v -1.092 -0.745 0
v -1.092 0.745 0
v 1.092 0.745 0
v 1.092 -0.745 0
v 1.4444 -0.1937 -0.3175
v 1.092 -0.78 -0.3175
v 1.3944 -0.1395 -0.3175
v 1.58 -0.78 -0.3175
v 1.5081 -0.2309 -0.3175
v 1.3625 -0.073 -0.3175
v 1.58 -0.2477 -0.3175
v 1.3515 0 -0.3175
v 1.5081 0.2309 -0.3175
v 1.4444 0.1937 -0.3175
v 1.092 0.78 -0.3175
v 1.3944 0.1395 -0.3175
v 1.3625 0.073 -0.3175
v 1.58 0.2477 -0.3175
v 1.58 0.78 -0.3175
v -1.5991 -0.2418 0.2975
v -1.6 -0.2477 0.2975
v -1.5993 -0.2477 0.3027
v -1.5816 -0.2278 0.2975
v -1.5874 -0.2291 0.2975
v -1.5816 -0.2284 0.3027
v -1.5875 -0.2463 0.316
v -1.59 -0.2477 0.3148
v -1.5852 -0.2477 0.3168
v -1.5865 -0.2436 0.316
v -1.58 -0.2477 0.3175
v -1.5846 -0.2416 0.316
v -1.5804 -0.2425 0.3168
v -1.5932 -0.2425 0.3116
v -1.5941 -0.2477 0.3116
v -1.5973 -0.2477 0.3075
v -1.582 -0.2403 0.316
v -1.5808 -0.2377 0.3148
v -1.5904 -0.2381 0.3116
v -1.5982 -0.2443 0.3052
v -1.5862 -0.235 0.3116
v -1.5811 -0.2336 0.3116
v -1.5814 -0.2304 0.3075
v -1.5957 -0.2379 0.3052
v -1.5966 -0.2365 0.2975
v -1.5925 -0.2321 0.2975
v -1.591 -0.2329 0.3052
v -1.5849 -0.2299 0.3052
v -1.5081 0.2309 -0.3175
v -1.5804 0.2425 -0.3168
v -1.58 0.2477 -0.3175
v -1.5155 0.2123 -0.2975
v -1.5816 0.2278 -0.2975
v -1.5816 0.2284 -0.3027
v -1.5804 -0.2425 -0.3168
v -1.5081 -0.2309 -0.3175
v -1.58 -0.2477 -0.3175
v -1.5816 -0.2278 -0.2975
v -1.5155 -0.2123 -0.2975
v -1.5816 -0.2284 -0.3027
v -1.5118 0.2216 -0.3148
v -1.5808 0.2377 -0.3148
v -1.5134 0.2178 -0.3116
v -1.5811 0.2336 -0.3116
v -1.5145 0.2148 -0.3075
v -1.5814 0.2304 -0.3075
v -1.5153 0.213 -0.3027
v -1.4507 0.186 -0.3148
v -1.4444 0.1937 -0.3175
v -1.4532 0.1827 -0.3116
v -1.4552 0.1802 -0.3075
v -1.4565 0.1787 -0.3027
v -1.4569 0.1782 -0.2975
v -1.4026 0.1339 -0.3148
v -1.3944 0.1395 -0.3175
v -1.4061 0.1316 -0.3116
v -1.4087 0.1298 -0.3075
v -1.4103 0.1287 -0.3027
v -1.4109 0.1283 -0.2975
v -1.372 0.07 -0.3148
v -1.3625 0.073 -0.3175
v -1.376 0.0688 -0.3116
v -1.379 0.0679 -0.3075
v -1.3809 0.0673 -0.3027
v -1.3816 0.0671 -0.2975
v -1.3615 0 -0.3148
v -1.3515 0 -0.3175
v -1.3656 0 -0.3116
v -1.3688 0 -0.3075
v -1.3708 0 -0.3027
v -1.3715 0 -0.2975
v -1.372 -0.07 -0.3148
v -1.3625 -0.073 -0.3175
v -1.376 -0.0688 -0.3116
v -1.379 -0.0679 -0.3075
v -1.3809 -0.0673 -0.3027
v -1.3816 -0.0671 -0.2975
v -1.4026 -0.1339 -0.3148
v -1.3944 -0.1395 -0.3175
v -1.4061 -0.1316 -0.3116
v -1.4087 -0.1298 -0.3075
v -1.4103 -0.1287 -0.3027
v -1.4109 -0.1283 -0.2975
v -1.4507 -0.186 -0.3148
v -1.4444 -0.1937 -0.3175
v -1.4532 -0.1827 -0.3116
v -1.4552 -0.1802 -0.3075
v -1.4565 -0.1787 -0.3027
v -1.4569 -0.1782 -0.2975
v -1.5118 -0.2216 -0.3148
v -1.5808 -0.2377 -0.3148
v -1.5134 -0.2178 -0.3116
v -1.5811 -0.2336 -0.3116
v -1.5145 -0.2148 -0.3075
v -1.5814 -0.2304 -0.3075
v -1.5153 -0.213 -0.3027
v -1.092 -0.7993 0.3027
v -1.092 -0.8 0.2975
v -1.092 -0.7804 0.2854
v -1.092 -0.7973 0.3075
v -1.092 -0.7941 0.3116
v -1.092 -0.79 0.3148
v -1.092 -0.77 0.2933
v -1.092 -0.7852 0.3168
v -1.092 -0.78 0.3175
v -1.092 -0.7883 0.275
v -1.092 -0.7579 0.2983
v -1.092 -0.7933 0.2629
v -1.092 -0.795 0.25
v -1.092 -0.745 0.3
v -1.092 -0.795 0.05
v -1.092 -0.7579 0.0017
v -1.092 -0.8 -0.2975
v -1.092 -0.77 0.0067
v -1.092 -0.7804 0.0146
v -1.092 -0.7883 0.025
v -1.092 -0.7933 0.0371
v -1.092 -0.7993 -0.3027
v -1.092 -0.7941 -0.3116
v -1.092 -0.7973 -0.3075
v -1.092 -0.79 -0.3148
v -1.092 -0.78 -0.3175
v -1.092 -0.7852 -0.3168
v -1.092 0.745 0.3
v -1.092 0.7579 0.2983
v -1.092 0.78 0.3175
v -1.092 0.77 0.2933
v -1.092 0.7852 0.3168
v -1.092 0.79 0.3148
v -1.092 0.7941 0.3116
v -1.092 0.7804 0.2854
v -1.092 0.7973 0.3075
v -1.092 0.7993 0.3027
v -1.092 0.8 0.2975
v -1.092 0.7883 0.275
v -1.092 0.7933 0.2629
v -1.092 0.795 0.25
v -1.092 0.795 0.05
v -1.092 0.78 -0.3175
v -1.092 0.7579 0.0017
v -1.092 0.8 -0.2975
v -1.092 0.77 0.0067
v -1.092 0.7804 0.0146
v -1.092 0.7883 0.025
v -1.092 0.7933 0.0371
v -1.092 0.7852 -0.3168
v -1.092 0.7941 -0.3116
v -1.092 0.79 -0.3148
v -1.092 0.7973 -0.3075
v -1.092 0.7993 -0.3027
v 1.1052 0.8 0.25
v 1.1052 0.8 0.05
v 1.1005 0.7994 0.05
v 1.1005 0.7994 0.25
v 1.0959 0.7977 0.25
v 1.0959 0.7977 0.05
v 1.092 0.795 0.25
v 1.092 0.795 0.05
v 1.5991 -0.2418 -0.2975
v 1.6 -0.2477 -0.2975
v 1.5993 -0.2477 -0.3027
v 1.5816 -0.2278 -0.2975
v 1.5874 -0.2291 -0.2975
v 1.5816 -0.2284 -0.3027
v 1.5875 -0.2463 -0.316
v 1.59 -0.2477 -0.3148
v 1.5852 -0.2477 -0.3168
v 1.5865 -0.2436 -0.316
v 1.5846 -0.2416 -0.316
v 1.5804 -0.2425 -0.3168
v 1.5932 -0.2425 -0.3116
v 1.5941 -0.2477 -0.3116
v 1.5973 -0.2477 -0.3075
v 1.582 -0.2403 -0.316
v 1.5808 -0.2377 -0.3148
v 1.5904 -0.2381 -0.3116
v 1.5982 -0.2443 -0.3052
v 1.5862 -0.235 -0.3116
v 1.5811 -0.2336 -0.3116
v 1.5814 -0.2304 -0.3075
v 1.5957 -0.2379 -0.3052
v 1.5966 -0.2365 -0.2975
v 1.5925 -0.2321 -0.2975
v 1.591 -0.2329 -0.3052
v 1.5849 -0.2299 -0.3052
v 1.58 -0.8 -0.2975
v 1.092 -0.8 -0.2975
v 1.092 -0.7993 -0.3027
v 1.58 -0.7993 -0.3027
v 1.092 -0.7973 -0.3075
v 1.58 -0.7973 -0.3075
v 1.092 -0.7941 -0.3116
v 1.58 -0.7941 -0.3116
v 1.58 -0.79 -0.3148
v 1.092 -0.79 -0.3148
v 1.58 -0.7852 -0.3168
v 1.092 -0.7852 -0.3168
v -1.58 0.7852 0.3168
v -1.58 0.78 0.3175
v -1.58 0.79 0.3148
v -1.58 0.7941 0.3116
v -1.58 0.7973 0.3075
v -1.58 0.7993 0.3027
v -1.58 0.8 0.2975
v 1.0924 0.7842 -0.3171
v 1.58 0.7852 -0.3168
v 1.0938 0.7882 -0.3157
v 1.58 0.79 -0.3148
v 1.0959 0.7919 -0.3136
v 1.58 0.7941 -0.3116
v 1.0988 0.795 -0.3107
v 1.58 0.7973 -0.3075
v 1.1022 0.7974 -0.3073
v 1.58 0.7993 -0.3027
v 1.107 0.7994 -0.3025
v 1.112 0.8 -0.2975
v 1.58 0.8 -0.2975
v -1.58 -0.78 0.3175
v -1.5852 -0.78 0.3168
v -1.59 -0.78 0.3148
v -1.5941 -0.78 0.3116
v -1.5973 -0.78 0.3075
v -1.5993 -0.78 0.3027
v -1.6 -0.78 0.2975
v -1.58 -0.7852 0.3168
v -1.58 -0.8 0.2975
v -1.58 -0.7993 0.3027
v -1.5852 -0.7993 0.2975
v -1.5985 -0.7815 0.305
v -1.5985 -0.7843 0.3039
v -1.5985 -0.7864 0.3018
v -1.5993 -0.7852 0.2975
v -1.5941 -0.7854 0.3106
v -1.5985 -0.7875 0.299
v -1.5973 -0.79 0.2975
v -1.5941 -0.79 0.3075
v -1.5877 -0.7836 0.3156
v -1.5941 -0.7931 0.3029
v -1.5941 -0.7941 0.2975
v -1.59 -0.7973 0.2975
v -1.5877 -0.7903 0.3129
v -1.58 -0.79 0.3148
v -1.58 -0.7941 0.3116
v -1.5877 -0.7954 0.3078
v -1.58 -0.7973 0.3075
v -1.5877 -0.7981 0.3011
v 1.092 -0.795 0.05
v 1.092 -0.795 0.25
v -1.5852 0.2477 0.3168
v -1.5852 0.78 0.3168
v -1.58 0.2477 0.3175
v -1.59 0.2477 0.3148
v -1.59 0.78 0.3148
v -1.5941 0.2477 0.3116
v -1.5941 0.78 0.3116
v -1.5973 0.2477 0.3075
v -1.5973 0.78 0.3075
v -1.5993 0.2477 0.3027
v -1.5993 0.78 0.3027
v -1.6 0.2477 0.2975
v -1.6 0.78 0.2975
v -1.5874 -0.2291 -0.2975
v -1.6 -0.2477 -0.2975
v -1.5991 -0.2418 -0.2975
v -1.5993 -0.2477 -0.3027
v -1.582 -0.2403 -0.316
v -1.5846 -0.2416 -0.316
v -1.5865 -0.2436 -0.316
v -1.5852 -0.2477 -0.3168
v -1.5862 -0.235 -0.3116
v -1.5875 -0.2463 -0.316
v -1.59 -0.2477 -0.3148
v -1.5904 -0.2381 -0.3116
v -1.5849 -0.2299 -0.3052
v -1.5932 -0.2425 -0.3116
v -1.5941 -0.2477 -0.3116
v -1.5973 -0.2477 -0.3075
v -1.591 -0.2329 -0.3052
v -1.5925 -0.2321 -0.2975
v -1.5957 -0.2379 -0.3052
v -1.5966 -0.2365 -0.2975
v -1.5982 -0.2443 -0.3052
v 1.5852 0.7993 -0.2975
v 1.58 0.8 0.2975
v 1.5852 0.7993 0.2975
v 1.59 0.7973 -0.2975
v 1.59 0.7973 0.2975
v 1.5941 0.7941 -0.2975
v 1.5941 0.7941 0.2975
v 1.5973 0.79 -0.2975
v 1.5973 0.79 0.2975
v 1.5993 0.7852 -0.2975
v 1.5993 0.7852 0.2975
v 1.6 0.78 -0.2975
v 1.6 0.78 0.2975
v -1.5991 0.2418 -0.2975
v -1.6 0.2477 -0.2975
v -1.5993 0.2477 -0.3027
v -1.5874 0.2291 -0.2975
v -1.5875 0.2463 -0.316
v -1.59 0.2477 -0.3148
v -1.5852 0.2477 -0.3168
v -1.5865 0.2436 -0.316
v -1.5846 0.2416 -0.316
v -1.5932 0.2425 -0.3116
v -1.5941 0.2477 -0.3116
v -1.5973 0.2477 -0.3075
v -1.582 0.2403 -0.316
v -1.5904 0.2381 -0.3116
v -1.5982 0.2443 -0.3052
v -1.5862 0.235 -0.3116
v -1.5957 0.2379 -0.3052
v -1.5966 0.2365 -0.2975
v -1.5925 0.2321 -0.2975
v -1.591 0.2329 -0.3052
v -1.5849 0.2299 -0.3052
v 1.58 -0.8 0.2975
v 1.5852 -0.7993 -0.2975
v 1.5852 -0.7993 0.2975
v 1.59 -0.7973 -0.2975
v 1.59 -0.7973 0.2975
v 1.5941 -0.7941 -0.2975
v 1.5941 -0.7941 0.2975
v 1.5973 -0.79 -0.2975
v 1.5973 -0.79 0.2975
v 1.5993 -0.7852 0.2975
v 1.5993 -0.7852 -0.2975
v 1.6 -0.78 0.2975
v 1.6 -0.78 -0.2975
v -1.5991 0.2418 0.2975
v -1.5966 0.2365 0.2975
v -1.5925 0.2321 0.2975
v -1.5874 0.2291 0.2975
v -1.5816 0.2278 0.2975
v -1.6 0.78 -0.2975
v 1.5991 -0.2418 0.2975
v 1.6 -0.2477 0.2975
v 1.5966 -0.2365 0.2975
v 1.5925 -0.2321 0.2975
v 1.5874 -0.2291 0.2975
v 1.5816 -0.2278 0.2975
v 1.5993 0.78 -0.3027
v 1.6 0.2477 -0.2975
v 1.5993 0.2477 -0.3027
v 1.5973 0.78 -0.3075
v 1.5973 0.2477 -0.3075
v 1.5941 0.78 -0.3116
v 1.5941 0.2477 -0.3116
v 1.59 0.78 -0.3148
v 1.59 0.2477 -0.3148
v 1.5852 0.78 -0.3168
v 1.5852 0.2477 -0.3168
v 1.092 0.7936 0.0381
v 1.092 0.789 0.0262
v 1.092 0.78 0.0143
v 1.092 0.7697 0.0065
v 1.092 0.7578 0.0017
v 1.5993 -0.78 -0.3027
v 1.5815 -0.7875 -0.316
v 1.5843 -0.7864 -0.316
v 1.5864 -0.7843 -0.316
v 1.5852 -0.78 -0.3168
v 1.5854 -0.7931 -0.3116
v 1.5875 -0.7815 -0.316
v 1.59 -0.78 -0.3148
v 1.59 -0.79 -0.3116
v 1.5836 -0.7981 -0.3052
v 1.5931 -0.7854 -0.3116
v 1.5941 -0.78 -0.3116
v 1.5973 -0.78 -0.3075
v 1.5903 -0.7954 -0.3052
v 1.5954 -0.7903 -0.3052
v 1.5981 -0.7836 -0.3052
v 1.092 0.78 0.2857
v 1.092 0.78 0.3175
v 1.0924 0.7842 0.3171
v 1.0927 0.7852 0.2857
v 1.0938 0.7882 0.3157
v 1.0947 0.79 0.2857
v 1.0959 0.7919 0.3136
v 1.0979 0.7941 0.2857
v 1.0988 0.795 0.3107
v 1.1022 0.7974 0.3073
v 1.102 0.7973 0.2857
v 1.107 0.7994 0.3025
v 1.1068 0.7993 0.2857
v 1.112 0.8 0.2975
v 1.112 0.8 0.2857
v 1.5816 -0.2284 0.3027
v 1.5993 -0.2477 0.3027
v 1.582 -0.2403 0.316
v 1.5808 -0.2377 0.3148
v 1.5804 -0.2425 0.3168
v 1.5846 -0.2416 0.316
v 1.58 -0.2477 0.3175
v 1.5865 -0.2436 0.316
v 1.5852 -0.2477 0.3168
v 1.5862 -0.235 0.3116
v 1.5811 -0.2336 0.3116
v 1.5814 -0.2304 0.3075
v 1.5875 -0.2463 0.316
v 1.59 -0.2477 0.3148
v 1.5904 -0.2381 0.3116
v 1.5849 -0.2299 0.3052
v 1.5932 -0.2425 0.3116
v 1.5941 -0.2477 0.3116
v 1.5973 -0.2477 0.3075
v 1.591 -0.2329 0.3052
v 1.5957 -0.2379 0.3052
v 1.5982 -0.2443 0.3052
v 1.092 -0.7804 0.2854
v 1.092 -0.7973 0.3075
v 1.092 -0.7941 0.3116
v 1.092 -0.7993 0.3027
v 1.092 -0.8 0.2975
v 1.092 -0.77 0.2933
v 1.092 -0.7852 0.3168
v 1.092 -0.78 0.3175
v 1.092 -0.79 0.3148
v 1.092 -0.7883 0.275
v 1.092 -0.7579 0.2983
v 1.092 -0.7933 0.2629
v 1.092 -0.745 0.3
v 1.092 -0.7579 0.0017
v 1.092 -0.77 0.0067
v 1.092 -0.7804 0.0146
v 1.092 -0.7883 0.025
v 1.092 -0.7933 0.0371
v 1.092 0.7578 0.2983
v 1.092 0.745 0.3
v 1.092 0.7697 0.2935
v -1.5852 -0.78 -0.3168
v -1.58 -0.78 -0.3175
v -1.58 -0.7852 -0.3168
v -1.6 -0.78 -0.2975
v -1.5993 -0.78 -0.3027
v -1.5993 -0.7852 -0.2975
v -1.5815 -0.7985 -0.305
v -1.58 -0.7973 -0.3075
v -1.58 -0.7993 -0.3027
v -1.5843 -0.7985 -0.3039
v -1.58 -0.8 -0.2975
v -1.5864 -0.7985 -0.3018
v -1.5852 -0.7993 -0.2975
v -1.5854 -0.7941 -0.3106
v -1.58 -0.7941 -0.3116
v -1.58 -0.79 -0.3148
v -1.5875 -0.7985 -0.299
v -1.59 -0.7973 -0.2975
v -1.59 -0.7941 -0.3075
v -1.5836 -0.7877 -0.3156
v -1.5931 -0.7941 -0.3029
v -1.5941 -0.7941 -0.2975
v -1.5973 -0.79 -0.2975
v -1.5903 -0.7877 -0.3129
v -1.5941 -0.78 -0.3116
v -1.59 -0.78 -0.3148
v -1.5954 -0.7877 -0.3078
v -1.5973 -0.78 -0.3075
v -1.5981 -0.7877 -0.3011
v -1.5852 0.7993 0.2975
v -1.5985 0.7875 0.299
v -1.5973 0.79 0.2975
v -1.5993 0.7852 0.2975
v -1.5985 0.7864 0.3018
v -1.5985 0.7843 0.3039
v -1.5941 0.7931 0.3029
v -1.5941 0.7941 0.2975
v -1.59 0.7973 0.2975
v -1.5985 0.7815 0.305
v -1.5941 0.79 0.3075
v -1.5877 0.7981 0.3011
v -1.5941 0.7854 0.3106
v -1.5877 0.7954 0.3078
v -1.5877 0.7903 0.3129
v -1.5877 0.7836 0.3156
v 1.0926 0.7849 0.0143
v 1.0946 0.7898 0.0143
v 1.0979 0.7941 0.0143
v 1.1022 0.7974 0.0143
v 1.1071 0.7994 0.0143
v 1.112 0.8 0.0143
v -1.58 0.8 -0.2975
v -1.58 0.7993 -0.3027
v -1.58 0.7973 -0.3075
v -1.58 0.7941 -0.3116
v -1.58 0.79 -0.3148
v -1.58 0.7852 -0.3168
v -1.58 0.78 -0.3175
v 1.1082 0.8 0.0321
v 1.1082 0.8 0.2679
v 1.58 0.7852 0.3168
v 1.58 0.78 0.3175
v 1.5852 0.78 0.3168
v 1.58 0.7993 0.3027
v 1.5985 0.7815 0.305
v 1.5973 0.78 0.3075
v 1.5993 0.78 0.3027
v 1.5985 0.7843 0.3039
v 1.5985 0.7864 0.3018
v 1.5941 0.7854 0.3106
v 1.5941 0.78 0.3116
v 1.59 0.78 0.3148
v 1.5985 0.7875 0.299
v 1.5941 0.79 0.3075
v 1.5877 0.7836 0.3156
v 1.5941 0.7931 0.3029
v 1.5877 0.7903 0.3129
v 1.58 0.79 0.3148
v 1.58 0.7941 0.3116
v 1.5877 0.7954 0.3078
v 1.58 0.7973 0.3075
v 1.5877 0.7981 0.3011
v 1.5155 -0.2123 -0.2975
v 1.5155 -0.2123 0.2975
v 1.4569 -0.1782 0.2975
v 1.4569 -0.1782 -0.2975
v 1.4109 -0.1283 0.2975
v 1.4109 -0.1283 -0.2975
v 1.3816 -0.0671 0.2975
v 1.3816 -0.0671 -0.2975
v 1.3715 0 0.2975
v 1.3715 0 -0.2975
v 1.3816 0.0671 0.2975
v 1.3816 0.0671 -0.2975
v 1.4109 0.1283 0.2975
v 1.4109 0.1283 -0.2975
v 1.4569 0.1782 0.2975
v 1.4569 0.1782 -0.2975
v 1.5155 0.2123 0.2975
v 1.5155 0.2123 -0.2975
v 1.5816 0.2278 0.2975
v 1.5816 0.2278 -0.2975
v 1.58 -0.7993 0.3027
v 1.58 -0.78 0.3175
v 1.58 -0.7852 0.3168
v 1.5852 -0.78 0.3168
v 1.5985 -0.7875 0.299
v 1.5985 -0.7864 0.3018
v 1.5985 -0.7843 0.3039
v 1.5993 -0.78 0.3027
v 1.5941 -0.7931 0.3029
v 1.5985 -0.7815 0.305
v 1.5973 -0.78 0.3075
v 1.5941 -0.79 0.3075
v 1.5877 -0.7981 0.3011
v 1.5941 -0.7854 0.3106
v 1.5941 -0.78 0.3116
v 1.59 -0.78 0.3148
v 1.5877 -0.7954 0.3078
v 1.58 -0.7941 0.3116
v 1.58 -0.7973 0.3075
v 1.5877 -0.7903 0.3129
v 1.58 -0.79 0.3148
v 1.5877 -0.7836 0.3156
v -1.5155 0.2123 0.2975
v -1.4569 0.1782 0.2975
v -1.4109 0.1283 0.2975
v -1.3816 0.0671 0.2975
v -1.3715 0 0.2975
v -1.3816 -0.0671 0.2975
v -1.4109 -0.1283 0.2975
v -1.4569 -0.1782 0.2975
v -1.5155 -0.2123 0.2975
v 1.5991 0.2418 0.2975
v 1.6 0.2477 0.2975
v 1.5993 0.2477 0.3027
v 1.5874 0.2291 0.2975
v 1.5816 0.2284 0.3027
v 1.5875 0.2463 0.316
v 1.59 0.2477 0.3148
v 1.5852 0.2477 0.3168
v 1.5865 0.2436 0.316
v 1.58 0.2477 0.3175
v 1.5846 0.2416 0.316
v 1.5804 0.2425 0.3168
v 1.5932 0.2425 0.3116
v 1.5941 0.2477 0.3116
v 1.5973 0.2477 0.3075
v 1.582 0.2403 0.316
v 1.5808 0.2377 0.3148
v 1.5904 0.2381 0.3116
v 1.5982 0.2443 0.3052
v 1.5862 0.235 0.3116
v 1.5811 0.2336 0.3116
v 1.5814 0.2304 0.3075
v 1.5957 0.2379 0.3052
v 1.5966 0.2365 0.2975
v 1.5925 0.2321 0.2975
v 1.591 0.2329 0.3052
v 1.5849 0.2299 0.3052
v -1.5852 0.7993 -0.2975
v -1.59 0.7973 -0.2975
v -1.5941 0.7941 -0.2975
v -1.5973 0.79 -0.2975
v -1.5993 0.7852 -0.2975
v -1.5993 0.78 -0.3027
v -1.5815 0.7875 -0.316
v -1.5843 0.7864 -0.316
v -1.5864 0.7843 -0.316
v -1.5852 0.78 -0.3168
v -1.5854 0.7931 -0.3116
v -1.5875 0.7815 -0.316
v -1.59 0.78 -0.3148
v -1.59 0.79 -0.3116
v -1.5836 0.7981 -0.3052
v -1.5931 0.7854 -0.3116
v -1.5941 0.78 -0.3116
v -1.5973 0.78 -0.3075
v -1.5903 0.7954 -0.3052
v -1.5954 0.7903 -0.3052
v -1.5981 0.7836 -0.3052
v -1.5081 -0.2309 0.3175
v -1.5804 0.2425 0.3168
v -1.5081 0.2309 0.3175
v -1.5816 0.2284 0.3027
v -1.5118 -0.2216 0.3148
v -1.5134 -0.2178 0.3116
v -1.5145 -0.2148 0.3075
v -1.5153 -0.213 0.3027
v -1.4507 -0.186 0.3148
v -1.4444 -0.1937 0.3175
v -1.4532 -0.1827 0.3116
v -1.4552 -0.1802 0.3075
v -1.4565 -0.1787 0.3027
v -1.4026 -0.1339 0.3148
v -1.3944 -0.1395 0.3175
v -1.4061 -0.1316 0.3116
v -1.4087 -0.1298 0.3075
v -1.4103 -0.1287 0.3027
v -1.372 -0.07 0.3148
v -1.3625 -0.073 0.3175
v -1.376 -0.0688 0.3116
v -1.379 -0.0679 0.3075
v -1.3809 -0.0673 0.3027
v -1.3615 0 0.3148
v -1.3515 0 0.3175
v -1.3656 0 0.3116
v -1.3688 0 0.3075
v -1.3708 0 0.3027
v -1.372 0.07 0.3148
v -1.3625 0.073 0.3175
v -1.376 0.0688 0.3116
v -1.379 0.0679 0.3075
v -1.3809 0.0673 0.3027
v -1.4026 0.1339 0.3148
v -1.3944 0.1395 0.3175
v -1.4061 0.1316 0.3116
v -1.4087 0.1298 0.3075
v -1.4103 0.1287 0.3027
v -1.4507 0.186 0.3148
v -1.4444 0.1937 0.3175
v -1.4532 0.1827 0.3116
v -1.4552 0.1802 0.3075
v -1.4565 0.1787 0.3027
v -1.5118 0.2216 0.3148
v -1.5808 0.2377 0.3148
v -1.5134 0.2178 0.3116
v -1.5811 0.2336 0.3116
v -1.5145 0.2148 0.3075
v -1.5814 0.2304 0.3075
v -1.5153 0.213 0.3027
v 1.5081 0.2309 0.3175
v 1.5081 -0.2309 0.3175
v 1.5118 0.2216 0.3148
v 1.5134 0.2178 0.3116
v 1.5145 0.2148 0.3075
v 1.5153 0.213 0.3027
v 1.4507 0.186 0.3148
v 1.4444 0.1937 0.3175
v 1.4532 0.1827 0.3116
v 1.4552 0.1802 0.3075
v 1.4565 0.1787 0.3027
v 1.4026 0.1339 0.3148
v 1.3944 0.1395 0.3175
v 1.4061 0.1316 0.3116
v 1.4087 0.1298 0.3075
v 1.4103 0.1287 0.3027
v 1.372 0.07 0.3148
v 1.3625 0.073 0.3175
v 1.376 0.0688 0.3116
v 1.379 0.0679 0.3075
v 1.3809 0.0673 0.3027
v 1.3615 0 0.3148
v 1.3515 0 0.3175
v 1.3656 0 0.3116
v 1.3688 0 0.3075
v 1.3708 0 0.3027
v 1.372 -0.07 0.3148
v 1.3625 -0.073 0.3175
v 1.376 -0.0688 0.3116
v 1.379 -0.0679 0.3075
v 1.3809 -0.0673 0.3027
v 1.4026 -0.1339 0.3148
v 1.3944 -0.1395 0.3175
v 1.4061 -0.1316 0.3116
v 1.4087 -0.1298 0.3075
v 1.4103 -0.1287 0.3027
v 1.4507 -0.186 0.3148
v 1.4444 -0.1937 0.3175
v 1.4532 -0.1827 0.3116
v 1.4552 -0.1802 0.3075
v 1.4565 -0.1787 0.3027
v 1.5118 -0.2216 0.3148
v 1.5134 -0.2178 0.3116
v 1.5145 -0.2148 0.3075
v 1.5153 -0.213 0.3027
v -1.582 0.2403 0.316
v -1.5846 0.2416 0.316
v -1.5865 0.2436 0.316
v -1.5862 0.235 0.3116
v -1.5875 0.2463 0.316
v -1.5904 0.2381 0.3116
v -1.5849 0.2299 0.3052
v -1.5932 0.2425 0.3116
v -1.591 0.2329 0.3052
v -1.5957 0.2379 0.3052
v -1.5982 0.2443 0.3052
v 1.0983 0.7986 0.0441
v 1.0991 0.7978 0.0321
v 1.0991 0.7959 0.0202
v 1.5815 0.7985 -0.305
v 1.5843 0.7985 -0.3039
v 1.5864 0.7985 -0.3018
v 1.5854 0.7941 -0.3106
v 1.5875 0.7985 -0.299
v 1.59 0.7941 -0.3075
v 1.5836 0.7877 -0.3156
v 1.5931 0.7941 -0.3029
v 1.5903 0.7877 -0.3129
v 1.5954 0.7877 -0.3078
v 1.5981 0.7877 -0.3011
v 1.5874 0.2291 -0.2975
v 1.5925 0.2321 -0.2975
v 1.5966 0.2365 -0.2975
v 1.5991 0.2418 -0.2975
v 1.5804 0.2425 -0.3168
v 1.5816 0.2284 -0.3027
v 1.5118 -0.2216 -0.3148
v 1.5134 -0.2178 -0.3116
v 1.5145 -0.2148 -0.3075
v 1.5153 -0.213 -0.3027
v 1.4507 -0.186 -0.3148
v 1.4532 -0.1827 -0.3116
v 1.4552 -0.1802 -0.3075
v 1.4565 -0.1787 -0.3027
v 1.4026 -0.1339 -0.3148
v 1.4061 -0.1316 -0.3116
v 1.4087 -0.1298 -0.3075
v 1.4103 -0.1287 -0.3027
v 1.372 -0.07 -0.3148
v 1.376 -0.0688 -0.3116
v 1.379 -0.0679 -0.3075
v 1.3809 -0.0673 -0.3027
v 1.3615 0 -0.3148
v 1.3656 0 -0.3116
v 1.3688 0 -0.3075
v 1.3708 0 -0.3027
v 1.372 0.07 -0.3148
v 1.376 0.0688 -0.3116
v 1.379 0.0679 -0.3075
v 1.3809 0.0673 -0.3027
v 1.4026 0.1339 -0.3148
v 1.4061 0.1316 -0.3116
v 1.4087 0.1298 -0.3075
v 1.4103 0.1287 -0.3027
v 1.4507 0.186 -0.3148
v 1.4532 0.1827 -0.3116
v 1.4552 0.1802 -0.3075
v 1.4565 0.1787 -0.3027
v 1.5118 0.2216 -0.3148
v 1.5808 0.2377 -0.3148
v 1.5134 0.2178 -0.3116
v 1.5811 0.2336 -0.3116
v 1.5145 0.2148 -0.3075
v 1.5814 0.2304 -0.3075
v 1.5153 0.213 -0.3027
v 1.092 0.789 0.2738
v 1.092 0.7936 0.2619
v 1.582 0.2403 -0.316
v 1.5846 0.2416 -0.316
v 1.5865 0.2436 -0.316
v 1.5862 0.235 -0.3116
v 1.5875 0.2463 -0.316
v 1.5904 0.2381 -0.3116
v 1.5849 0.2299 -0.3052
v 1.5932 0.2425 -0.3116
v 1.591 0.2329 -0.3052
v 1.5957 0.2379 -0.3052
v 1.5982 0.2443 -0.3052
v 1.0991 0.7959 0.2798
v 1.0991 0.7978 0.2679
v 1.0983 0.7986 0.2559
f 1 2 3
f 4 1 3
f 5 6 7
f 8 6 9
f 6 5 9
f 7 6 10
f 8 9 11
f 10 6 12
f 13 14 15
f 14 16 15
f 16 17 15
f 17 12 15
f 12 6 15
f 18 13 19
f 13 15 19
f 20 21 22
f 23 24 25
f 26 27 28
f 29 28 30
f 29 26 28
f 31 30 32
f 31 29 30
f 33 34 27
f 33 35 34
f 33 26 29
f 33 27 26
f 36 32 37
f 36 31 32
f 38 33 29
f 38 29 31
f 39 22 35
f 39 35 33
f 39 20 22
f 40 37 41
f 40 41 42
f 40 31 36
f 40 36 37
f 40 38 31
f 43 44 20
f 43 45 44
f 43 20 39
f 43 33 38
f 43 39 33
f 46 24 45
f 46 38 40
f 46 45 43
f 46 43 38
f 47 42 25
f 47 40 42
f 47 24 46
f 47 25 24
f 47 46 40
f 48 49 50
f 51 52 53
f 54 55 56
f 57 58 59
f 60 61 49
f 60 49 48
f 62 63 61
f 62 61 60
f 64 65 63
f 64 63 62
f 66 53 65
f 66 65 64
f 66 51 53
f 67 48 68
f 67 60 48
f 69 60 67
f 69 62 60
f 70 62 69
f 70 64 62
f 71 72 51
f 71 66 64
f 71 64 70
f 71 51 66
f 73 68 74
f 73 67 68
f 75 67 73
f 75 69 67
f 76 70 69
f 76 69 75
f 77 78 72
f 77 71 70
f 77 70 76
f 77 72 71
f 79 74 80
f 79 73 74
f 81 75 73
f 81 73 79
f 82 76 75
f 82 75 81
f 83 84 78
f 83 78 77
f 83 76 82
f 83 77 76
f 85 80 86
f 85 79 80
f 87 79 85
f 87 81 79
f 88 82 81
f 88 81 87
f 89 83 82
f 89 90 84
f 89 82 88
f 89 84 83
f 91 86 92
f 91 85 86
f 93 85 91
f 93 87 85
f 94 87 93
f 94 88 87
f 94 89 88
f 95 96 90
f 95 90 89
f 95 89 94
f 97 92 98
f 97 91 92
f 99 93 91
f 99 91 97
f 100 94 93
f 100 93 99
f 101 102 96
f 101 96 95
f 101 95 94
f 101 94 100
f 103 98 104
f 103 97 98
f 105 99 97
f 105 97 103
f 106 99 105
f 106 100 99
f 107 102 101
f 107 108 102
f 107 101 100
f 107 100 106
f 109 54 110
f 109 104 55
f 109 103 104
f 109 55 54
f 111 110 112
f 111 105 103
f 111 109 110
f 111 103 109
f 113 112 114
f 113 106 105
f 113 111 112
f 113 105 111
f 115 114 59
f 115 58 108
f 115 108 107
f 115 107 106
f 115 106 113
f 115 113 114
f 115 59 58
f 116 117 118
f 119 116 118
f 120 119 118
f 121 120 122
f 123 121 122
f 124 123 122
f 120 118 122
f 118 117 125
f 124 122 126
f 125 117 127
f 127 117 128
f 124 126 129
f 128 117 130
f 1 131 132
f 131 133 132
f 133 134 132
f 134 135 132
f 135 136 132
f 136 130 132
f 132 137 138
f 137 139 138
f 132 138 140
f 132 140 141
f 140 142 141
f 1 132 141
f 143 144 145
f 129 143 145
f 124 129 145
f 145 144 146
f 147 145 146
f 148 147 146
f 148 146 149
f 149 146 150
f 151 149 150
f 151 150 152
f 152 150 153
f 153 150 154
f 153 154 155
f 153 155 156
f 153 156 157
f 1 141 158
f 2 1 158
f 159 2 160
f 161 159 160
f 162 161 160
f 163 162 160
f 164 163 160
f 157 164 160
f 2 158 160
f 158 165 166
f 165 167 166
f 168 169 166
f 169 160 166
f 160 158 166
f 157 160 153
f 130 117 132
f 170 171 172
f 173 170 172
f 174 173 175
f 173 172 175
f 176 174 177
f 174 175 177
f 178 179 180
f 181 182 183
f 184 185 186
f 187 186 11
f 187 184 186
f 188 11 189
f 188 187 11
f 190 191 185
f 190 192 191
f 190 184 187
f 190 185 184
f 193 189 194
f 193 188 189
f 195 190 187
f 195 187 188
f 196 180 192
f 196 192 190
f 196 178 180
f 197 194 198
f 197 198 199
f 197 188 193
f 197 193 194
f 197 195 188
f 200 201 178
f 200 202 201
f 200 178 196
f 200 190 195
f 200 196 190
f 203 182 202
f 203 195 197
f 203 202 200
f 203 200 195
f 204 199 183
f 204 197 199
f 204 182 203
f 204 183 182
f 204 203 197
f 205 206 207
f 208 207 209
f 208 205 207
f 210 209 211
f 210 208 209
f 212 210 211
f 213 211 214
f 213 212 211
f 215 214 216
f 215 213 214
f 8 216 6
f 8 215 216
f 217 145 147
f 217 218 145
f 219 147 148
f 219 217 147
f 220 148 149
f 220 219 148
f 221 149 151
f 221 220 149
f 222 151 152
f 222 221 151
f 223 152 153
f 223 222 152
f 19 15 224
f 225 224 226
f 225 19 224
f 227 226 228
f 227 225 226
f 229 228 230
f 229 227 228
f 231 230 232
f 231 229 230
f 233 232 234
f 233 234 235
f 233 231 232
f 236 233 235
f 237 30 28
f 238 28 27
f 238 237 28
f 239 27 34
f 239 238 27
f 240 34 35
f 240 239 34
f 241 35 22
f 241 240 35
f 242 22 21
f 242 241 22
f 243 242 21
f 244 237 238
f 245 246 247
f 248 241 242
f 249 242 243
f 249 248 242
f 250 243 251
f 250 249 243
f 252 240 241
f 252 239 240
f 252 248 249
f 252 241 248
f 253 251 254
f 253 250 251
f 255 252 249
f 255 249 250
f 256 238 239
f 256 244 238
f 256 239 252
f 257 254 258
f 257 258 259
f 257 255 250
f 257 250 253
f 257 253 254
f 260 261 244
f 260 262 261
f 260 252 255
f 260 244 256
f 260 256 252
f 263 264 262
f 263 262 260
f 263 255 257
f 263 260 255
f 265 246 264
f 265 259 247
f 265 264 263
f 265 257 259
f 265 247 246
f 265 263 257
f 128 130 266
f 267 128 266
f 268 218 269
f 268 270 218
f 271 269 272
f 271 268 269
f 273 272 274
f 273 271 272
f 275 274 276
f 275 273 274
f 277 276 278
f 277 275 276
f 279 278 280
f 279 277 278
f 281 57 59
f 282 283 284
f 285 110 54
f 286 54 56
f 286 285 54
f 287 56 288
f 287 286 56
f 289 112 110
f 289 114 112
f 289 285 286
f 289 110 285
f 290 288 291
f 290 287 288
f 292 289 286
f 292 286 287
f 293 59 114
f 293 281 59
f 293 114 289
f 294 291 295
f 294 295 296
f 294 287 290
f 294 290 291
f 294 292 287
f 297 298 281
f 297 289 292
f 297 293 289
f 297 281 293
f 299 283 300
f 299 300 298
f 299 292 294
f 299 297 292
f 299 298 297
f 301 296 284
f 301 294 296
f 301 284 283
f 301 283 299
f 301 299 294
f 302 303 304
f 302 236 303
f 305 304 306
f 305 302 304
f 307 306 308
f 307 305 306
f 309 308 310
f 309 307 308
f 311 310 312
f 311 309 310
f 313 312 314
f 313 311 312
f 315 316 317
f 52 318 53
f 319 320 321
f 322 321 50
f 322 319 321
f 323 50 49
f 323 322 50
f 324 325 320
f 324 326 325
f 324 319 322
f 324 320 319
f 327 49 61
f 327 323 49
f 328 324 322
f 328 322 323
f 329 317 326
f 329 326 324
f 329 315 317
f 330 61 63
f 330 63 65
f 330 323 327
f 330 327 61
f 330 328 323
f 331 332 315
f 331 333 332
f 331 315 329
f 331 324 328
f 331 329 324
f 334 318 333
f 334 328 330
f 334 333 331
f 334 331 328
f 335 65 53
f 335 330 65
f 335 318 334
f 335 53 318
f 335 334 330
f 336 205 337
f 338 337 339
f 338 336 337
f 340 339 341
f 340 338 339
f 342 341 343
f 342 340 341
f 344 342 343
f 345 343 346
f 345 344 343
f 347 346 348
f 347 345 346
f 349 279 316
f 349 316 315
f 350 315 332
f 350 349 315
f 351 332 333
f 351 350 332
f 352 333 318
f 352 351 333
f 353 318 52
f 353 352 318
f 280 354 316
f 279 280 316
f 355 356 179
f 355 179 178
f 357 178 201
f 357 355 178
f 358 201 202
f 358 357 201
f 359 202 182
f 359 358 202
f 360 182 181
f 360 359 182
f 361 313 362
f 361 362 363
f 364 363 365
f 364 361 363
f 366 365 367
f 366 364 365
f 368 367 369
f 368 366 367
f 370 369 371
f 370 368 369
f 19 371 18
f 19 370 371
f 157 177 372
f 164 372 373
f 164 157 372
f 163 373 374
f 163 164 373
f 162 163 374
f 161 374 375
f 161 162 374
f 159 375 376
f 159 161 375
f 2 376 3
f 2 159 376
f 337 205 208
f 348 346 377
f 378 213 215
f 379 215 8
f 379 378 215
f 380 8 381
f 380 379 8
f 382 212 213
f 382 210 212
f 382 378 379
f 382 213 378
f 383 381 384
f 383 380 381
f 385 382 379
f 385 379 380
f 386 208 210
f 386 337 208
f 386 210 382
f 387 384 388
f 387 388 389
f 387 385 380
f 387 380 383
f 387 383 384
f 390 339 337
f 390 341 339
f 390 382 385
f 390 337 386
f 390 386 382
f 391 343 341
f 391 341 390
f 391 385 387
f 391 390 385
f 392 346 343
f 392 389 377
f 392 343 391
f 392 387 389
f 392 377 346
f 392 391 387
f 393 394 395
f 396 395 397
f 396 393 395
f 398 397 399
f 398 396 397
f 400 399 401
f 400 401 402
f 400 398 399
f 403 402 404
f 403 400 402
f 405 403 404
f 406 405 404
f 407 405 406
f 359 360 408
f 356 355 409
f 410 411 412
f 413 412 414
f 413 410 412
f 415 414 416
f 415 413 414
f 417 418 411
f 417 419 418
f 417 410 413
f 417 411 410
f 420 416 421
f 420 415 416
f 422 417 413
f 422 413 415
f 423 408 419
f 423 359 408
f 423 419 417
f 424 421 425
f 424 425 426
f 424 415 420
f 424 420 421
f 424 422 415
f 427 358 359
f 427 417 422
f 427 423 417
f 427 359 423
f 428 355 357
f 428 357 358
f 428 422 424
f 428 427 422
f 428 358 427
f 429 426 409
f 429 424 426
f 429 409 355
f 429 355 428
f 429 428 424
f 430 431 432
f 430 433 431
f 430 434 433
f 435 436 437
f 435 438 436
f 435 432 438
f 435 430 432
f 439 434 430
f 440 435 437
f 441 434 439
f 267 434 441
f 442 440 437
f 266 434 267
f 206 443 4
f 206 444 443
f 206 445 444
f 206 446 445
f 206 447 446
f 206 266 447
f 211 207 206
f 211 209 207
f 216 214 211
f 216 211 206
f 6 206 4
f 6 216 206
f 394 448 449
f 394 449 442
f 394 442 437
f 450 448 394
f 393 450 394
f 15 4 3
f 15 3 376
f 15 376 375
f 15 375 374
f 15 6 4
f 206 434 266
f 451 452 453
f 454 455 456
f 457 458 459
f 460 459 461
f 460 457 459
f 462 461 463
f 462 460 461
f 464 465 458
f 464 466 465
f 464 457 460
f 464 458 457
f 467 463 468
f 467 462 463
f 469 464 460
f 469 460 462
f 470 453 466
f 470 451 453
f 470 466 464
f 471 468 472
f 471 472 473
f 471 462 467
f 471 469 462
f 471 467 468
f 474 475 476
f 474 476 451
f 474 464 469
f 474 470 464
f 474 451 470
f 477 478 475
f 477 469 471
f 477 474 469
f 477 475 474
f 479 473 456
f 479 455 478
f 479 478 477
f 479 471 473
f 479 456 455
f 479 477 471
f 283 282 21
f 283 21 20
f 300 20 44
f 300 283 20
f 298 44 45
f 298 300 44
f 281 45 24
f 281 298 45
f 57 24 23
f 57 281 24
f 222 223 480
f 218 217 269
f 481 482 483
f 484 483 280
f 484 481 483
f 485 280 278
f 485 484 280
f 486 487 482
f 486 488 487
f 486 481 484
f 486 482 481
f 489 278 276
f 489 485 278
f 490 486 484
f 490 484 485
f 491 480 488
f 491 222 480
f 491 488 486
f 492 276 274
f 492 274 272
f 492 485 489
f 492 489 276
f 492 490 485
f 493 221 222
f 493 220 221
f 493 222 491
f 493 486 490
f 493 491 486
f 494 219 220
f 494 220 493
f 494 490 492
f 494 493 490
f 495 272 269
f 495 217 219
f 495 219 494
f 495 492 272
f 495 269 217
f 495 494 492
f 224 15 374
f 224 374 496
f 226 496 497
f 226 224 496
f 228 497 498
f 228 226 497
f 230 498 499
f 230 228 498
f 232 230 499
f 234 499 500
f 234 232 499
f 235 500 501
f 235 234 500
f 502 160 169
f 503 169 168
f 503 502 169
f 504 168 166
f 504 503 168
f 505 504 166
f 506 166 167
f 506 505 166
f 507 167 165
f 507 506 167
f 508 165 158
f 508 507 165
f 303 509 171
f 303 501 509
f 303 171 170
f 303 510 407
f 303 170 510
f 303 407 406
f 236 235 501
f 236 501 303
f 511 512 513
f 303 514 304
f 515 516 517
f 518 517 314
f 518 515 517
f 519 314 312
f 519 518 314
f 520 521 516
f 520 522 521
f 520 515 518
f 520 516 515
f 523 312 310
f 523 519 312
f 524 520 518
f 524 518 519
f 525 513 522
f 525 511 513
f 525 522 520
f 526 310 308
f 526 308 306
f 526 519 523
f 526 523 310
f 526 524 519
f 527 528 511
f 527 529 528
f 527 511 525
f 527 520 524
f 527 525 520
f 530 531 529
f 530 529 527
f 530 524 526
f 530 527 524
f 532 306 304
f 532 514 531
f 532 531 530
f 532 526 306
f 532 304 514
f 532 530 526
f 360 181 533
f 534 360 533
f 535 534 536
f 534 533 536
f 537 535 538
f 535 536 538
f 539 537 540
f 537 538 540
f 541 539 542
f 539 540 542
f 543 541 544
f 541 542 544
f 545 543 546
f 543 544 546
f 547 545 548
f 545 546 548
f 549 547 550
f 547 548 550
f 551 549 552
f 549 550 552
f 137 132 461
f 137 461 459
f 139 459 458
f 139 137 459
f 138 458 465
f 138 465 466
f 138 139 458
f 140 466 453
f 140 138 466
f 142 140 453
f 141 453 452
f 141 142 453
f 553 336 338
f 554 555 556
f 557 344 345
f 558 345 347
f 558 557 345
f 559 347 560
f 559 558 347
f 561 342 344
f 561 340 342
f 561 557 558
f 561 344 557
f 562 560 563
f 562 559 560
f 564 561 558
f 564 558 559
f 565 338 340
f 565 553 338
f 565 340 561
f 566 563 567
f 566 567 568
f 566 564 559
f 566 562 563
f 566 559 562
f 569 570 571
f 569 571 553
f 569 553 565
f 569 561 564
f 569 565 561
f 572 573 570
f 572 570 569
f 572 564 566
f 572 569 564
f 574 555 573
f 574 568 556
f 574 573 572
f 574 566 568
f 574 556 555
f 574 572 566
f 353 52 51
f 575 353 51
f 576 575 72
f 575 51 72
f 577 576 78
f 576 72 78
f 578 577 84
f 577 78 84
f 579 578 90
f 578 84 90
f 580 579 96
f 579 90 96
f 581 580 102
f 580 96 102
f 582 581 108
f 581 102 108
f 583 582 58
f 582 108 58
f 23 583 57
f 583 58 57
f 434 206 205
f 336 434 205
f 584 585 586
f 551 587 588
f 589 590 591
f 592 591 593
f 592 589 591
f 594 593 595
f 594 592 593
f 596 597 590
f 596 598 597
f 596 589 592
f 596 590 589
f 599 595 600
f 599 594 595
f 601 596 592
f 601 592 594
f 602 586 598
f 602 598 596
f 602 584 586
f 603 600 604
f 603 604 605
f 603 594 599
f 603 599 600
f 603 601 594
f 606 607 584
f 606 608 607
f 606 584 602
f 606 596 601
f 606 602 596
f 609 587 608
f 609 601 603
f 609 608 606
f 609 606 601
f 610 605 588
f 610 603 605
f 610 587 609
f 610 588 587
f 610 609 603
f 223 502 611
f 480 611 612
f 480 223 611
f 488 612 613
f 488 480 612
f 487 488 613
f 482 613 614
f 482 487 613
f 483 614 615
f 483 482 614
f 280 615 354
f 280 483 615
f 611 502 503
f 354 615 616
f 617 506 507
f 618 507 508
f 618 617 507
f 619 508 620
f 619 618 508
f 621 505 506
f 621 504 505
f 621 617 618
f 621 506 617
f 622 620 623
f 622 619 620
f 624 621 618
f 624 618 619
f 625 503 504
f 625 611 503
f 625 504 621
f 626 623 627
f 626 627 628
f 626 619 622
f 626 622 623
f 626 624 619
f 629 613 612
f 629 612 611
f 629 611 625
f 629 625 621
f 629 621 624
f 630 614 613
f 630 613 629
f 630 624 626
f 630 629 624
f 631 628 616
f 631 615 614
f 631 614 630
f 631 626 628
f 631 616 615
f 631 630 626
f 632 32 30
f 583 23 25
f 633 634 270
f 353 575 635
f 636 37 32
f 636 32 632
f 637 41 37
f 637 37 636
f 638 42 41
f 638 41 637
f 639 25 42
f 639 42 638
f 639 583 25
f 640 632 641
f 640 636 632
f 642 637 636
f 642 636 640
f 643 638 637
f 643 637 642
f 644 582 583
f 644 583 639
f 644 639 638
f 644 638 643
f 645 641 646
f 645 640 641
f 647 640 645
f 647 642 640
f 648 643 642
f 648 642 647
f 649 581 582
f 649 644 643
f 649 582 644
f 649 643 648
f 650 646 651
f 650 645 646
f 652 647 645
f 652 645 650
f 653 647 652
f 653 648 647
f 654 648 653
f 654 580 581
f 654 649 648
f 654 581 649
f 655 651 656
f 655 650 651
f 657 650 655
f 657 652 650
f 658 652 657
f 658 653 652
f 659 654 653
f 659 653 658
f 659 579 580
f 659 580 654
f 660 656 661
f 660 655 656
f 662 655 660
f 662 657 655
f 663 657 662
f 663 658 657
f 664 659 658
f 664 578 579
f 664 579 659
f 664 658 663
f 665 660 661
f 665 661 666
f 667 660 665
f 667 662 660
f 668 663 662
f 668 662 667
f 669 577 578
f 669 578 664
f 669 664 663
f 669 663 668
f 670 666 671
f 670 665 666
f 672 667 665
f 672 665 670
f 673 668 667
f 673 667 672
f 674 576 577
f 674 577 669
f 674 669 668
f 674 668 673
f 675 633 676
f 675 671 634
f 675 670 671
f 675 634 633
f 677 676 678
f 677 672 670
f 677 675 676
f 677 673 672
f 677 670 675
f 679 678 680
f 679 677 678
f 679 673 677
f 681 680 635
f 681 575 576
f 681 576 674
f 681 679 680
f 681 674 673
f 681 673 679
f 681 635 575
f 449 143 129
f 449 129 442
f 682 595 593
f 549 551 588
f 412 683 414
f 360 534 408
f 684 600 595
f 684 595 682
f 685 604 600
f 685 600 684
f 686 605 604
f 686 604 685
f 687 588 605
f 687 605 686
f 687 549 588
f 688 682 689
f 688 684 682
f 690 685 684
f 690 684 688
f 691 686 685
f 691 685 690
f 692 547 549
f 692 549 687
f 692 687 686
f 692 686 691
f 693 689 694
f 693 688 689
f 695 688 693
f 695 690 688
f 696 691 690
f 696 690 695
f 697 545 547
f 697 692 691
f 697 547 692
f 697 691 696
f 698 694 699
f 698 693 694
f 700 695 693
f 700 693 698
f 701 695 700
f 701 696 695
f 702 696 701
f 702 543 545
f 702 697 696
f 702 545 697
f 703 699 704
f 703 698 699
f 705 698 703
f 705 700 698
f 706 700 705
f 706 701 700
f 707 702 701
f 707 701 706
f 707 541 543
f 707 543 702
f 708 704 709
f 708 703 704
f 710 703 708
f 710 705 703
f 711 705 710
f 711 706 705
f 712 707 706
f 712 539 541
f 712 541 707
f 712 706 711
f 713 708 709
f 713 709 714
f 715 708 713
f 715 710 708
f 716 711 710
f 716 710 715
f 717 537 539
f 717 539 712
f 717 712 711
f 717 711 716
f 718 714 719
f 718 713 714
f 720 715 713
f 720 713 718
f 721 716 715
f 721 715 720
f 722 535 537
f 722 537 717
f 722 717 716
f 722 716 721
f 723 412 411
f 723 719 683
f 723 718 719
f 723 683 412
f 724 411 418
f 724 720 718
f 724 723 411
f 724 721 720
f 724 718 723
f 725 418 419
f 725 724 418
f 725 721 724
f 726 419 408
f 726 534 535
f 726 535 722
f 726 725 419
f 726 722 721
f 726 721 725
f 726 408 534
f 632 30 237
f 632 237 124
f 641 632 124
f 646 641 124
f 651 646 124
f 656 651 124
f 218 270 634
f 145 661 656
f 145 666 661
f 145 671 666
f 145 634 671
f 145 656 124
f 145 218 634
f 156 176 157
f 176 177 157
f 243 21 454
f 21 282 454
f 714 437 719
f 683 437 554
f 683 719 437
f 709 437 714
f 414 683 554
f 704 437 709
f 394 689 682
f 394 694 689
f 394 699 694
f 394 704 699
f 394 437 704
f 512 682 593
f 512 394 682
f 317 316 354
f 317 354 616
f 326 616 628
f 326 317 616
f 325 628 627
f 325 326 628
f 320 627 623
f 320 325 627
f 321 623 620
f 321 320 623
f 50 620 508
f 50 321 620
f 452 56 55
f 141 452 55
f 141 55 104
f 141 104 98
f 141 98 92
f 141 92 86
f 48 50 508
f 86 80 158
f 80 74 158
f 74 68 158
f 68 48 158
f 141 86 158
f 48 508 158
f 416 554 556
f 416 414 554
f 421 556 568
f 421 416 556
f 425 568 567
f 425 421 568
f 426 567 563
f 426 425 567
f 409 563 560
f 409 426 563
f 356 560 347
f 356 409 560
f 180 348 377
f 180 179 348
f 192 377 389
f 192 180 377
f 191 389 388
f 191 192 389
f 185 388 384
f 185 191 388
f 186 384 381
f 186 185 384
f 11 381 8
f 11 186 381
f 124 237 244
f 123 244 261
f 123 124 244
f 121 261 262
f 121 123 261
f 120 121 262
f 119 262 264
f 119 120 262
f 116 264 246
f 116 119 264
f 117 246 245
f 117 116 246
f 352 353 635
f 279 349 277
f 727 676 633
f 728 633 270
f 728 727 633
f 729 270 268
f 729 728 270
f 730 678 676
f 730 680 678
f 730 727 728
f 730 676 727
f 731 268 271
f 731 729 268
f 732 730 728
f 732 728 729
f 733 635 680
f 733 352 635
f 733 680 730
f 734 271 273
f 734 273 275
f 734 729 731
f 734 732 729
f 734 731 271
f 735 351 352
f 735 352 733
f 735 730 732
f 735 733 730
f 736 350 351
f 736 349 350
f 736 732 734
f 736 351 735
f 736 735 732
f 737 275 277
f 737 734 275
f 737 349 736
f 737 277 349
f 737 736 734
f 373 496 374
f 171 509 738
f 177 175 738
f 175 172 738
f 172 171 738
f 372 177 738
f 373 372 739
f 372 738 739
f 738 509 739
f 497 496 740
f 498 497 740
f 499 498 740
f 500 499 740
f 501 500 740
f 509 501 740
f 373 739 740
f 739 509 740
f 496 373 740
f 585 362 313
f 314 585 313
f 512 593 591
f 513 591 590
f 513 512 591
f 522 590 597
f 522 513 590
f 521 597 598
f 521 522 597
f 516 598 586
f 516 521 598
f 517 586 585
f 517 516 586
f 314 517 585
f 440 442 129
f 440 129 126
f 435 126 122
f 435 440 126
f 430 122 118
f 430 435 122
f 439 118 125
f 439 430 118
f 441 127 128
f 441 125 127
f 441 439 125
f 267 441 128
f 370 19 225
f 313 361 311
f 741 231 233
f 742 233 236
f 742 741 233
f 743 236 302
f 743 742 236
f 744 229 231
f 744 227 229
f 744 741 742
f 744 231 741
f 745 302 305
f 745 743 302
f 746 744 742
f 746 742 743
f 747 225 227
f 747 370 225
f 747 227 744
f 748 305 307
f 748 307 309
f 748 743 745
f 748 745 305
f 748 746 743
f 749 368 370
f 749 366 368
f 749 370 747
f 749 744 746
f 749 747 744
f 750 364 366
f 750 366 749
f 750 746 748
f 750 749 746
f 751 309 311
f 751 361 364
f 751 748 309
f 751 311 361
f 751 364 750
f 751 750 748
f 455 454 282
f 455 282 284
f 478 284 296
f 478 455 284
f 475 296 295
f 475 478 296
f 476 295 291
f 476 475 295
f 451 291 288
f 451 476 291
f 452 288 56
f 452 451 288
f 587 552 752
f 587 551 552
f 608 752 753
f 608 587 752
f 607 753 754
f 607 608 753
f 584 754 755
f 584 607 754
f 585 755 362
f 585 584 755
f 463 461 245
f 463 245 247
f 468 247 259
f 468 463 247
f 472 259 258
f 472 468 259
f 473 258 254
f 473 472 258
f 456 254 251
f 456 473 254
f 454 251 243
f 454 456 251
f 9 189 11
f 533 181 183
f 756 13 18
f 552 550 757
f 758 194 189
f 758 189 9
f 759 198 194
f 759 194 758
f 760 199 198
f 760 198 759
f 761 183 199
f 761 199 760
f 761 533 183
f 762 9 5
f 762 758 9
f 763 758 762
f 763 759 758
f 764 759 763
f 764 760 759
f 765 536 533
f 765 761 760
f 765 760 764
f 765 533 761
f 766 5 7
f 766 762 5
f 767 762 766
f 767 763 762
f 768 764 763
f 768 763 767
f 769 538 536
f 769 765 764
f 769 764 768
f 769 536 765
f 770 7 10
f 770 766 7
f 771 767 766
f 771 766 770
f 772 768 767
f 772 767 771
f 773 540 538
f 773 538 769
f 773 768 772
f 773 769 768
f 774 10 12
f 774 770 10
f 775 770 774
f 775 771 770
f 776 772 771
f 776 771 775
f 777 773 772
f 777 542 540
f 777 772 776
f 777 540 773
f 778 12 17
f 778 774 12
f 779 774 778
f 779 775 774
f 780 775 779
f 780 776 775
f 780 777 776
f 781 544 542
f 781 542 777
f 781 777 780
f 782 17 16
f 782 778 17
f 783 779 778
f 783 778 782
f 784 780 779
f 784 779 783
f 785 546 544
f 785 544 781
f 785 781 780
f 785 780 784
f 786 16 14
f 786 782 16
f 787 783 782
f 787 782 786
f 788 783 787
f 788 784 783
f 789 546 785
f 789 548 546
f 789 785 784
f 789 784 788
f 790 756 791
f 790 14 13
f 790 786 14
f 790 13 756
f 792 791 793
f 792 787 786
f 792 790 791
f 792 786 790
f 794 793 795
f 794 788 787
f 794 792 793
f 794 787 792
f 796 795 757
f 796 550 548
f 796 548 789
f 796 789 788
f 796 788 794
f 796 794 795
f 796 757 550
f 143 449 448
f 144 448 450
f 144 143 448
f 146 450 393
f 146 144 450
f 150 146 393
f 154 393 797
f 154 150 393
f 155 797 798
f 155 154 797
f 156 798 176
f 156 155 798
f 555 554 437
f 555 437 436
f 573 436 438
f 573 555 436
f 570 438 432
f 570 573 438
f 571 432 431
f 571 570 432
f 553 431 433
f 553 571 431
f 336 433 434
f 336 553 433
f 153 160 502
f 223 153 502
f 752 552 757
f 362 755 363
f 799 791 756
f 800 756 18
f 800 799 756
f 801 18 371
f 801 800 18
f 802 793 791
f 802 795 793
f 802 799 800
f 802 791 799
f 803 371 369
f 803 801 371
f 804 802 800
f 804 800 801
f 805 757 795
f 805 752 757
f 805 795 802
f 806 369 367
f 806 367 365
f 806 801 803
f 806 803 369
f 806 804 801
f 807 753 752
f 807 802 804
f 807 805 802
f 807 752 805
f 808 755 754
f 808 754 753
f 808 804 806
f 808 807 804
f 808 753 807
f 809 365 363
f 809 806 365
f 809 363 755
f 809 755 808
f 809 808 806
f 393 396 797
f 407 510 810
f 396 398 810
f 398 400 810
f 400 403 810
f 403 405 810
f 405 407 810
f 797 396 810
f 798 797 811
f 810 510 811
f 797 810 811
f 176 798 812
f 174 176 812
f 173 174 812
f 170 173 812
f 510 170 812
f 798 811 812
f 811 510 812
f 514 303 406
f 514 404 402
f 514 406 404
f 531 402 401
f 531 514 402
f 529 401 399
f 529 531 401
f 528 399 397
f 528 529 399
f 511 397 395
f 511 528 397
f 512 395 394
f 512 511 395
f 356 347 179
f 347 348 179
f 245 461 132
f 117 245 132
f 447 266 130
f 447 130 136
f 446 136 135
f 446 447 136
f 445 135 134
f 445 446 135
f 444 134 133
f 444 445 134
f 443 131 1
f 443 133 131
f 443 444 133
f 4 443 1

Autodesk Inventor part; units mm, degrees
ref_plane "YZ Plane" through (0, 0, 0) normal (1, 0, 0) x (0, 1, 0)
ref_plane "XZ Plane" through (0, 0, 0) normal (0, 1, 0) x (-1, 0, 0)
ref_plane "XY Plane" through (0, 0, 0) normal (0, 0, 1) x (1, 0, 0)
sketch "Sketch1" plane through (0, 0, 0) normal (0, 0, 1) x (1, 0, 0)
  line L0 (-1.092, -0.795) -> (1.092, -0.795)
  line L1 (1.092, -0.795) -> (1.092, 0.795)
  line L2 (1.092, 0.795) -> (-1.092, 0.795)
  line L3 (-1.092, 0.795) -> (-1.092, -0.795)
  line L4 (-1.092, -0.795) -> (1.092, 0.795) construction
  line L5 (1.092, -0.795) -> (-1.092, 0.795) construction
  line L6 (-1.092, 0.795) -> (-1.092, 0.8)
  line L7 (-1.092, 0.8) -> (-1.6, 0.8)
  line L8 (-1.6, 0.8) -> (-1.6, 0.2285)
  arc A0 (-1.6, -0.2285) -> (-1.6, 0.2285) centre (-1.6, 0) ccw
  line L9 (-1.6, -0.2285) -> (-1.6, -0.8)
  line L10 (-1.6, -0.8) -> (-1.092, -0.8)
  line L11 (-1.092, -0.8) -> (-1.092, -0.795)
  line L12 (1.092, -0.795) -> (1.092, -0.8)
  line L13 (1.092, -0.8) -> (1.6, -0.8)
  line L14 (1.6, -0.8) -> (1.6, -0.2285)
  arc A1 (1.6, 0.2285) -> (1.6, -0.2285) centre (1.6, 0) ccw
  line L15 (1.6, 0.2285) -> (1.6, 0.8)
  line L16 (1.092, 0.8) -> (1.6, 0.8)
  line L17 (1.092, 0.8) -> (1.092, 0.795)
  point P0 (0, 0)
  dimension "d0" = 3.2
  dimension "d1" = 1.6
  dimension "d2" = 1.59
  dimension "d3" = 0.508
  dimension "d4" = 0.457
extrude "Extrusion1" add sketch "Sketch1" along normal blind 0.3 contours L3 L2 L1 L0
extrude "Extrusion2" add sketch "Sketch1" along normal mid plane 0.635 contours L11 L10 L9 A0 L8 L7 L6 L3 | L1 L17 L16 L15 A1 L14 L13 L12
fillet "Fillet1" radius 0.05 4 edges at (0, -0.795, 0.3) (0, -0.795, 0) (0, 0.795, 0.3) (0, 0.795, 0)
fillet "Fillet2" radius 0.02 29 edges at (-1.346, 0.8, 0.3175) (-1.6, 0.8, 0) (-1.6, 0.5142, 0.3175) (-1.6, 0.2285, 0) (-1.6, 0.5142, -0.3175) (-1.346, 0.8, -0.3175) (-1.346, -0.8, 0.3175) (-1.6, -0.5143, 0.3175) (-1.3715, 0, 0.3175) (-1.3715, 0, -0.3175) (-1.6, -0.2285, 0) (-1.6, -0.5143, -0.3175) (-1.6, -0.8, 0) (-1.346, -0.8, -0.3175) (1.346, -0.8, 0.3175) (1.6, -0.5143, 0.3175) (1.6, -0.8, 0) (1.346, -0.8, -0.3175) (1.092, 0.8, 0) (1.346, 0.8, 0.3175) (1.6, 0.5142, 0.3175) (1.3715, 0, 0.3175) (1.6, -0.2285, 0) (1.6, -0.5143, -0.3175) (1.3715, 0, -0.3175) (1.6, 0.2285, 0) (1.6, 0.5142, -0.3175) (1.346, 0.8, -0.3175) (1.6, 0.8, 0)
properties part number "23-12m0" material "Copper"
